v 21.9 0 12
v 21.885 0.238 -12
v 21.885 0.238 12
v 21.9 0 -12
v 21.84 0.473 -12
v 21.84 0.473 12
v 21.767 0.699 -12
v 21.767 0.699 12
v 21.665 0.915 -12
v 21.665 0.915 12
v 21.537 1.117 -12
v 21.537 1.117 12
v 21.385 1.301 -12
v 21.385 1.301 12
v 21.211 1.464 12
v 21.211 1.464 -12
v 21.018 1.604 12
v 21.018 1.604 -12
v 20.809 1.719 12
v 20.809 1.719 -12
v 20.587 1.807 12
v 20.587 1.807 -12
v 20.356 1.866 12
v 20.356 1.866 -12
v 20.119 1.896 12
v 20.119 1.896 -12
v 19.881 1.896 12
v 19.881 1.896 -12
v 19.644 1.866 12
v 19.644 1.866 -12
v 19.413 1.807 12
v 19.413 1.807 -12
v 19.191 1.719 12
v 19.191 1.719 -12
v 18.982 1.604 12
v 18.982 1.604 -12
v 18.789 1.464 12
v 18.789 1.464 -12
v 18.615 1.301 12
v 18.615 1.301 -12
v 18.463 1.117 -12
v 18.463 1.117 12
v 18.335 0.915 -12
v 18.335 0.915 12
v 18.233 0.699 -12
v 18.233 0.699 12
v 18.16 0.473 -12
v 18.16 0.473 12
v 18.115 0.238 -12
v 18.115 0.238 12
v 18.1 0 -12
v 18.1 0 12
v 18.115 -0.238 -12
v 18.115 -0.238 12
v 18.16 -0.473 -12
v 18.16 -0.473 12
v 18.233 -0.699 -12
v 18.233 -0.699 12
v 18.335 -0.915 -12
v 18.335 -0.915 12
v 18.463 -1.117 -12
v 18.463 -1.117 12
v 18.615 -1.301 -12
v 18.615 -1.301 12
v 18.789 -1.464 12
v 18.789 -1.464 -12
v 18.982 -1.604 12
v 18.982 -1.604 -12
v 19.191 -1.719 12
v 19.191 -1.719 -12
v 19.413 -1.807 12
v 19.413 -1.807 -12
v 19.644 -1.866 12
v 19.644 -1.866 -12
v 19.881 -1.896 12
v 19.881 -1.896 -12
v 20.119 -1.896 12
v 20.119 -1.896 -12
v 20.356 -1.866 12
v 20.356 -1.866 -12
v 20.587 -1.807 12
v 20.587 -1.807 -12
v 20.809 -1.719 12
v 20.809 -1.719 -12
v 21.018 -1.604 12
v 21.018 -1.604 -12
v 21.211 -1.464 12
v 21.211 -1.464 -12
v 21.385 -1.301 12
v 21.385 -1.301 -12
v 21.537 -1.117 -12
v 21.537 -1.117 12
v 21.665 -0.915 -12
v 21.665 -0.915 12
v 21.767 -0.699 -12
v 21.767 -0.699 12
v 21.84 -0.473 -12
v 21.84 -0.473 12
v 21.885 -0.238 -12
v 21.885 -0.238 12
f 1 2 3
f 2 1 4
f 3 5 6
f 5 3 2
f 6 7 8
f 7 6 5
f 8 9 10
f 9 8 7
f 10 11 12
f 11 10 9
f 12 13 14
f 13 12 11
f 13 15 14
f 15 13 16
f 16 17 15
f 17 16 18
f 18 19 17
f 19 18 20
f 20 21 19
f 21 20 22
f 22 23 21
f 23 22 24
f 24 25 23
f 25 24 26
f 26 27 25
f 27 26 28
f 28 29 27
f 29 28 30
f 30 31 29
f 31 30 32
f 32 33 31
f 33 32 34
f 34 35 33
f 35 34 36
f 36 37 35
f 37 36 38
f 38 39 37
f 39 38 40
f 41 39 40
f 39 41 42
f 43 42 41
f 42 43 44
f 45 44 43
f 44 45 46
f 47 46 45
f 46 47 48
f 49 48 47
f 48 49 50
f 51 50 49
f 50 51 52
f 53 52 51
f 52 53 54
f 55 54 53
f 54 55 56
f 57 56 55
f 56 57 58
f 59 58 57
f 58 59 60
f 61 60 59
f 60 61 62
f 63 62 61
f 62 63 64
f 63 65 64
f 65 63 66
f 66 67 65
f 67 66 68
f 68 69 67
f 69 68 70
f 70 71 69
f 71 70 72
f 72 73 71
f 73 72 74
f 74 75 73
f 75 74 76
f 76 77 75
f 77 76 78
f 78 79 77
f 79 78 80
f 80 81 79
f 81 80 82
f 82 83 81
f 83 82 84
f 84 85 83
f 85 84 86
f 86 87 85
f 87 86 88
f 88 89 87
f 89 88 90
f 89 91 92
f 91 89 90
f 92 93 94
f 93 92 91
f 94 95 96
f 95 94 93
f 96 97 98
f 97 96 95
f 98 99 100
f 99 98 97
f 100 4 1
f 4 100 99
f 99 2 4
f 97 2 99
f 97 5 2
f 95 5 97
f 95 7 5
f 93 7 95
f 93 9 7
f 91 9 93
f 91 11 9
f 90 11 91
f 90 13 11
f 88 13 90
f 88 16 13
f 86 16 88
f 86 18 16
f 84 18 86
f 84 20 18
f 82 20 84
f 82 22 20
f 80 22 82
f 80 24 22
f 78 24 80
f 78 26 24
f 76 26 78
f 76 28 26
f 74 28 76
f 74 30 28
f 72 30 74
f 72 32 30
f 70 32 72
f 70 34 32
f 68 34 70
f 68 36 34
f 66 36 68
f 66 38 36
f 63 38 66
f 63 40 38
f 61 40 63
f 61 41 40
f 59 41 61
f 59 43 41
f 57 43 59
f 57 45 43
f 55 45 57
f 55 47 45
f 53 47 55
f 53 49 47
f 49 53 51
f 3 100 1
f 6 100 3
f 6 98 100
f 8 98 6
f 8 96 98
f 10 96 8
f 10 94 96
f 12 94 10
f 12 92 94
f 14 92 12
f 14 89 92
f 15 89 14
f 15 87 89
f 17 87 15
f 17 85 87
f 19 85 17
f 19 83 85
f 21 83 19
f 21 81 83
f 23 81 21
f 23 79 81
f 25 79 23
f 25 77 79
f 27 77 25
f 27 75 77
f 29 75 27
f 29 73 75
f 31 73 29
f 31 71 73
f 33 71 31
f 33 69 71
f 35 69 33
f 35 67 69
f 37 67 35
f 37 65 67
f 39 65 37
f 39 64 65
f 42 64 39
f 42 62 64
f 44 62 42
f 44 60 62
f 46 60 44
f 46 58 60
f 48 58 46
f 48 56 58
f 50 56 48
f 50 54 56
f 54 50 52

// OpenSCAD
// file: robot_settings.scad
main_box_x = 100; // 96
main_box_y = 102;
main_box_z = 74; // 74.5

lfp_main_box_x = 65;
lfp_main_box_y = 151;
lfp_main_box_z = 95;

wall_thickness = 2;

rail_gap = 2;
rail_inset = 7;

rail_thickness = 7;
rail_length = 250;
rail_width = 250;

raspberry_pi_screw_seperation_y = 57;
raspberry_pi_screw_seperation_z = 48;
raspberry_pi_peg_h = 5;

battery_box_peg_h = 6;
battery_box_peg_d = 8;
battery_box_peg_cutout = 5;

gears_module = 1;
pinion_gear_teeth = 32;
pinion_gear_width = 5;
pinion_gear_bore = 8;

gears_setback_distance = 25;
gear_post_height = 2 * pinion_gear_width + rail_thickness + 8 ;

steering_motor_mount_x = 45;
steering_motor_mount_y = 36;
steering_motor_mount_z = 18;
steering_motor_mount_setback_distance = gears_setback_distance + 16;

dc_motor_drivertype = "Teyleten"; // Teyleten
isAdafruit = (dc_motor_drivertype == "Adafruit");

drv8871_x = isAdafruit ? 20.3 : 21.6;
drv8871_y = isAdafruit ?  24 : 25;

drv8871_z = 2;
drv8871_screw_d = 2.5;
drv8871_solder_points_z = 2;

drv8871mount_edge_x = 1.5;
drv8871mount_edge_wall = 3;
drv8871mount_z = 5;
drv8871mount_x = drv8871_x +  drv8871mount_edge_wall - 2* drv8871mount_edge_x;
drv8871mount_y = 19;

drv8871_screw_distance = 15.64;
drv8871_solder_points_d = 1.66;
drv8871_solder_offset_y = 4.4;
drv8871_solder_inner_points_distance = 5;
drv8871_solder_outer_points_distance = 12;

dc_motor_75_1_housing_minus_encoder_z = 53.8;
dc_motor_75_1_encoder_z = 14.75;
dc_motor_housing_minus_encoder_z = 48;
dc_motor_encoder_z = 9.33;
dc_motor_encoder_wheel_d = 13.4;
dc_motor_encoder_wheel_thickness = 5;
dc_motor_encoder_wheel_gap = 3;
dc_motor_encoder_circuit_thickness = 2;
dc_motor_cutout_d = 24.8;
dc_motor_cutout_z = 19.5;


M3_shaft_d = 2.82;

dc_motor_screw_head_z = 2;
dc_motor_screw_head_d = 5.6;
dc_motor_screw_d = 3.2;
dc_motor_screw_offset = 8.5;

dc_motor_axle_ring_z = 3;
dc_motor_axle_ring_d = 7.2;
dc_motor_axle_cutout_d = 4.2;
dc_motor_axle_cutout_z = 10;
dc_motor_axle_notch_cutout = 0.4;
dc_motor_axle_notch_cutout_z = 6;

pdmount_x = 20;
pdmount_y = 30;
pdmount_z = 2;
pdmount_edge_x = 1.5;
pdmount_edge_wall = 3;

steering_shaft_z = 45;
steering_shaft_d = 7;
steering_shaft_motor_fitting_d = 9;
coupler_length = 24.6;
coupler_diameter = 14;
coupler_screw_d = 4;
coupler_screw_z_offset = 5;
coupler_gear_side_insert = 12.6;
steering_shaft_with_coupler_z = steering_shaft_z - coupler_gear_side_insert;

lidar_mount_y = 110;
lidar_mount_x = 65 + 20;
lidar_narrow_screws = 40;
lidar_wide_screws = 56;
lidar_front_to_back_screws = 70;
lidar_screw_d = 3;
lidar_circuitboard_x = 20;
lidar_circuitboard_y = 35;
lidar_circuitboard_z = 1.2;
lidar_cord_length = 29;

ball_bearing_height = 7;
ball_bearing_outer_diameter = 22;
ball_bearing_inner_diameter = 8;

M4_diameter = 5.1;
M3_diameter = 2.9;
M3_length = 35;
M3_cap_length= 3;
M3_cap_diameter = 5.44;

suspension_spring_outer_diameter = 8;
suspension_spring_inner_diameter = 5.3;

armature_holder_height = 20;
armature_holder_thickness = 8;
pull_bar_peg_r = 3.2;
apparatus_locking_peg_d = 4;

rack_module = 1;
rack_length = main_box_x;
rack_height = 5;
rack_width = 10;
rack_teeth = 30;
rack_bore = 3;

pull_bar_length = rail_width / 2 - rack_length + 1;

// tire hardware
axle_length = 24 + ball_bearing_height; 
axle_reciever_inner_diameter = 8.2;
axle_reciever_outer_diameter = 12;
axle_reciever_length = 18.8;
axle_notch_length = 15;
axle_notch_cutout = 2.4;

// power distribution bar
power_bar_cutout_x = 96;
power_bar_y = 19.1;
power_bar_z = 1.5;
power_bar_screw_distance = 91.4;
power_bar_screw_d = 2.8;
power_bar_standoff_z = 5;
power_bar_standoff_d = 6.83;

pico_expander_width = 63;
pico_expander_height = 57;
pico_screw_hole_offset = 3;
pico_screw_hole_d = 2.5;

usbhub_thickness = 11.7;
usbhub_depth = 37.5;
usbhub_width = 86.7;
usbhub_end_port_width = 14.8;
usbhub_end_port_height = 12;
usbhub_front_face_safe_zone_left = 15;
usbhub_front_face_safe_zone_right = 14.8;

switch_w = 16;
switch_cutout_d = 12.2;
switch_bump_h = 2;
switch_bump_l = 18.2;

i2c_mount_thickness = 3;
i2c_w = 28;
i2c_l = 28;
i2c_circuitboard_thickness = 1.23;
i2c_bottom_notch_w = 14.35;
i2c_bottom_notch_depth = 1;
i2c_screw_hole_d = 1.9;
i2c_screw_hole_offset = 1.4;
i2c_pin_l = 11;
i2c_pin_d = 0.8;
i2c_pin_offset = 1.5;
i2c_pin_separation = 2.5;
i2c_all_pins_l = 8.3;
i2c_screen_thickness = 1.88;
i2c_screen_w = 14.6;
i2c_screen_d = 27;
i2c_screen_offset = 4.1;
// main file
include <robot_settings.scad>
$fn=50;
  
 print_front_rack_grab_bar_peg = false;
 print_apparatus_peg = true;
  

// this applies to all locking pegs
module apparatus_peg()
{
  translate([20, 0, 0])
  cylinder(h = ball_bearing_outer_diameter + 2, 
      d = apparatus_locking_peg_d - .2, center = true);
}
if (print_apparatus_peg)
    apparatus_peg();

// this applies to the front grab bar
module front_rack_grab_bar_peg()
{
  translate([40, 0, 0])
   cylinder(h = armature_holder_height + 8, 
      r = pull_bar_peg_r - .24, center = true);
  
  translate([37.5, -1, armature_holder_height / 2 + 3.3])
  linear_extrude(2)
  text(".24", size = 2.5);
}
if (print_front_rack_grab_bar_peg)
  front_rack_grab_bar_peg();
